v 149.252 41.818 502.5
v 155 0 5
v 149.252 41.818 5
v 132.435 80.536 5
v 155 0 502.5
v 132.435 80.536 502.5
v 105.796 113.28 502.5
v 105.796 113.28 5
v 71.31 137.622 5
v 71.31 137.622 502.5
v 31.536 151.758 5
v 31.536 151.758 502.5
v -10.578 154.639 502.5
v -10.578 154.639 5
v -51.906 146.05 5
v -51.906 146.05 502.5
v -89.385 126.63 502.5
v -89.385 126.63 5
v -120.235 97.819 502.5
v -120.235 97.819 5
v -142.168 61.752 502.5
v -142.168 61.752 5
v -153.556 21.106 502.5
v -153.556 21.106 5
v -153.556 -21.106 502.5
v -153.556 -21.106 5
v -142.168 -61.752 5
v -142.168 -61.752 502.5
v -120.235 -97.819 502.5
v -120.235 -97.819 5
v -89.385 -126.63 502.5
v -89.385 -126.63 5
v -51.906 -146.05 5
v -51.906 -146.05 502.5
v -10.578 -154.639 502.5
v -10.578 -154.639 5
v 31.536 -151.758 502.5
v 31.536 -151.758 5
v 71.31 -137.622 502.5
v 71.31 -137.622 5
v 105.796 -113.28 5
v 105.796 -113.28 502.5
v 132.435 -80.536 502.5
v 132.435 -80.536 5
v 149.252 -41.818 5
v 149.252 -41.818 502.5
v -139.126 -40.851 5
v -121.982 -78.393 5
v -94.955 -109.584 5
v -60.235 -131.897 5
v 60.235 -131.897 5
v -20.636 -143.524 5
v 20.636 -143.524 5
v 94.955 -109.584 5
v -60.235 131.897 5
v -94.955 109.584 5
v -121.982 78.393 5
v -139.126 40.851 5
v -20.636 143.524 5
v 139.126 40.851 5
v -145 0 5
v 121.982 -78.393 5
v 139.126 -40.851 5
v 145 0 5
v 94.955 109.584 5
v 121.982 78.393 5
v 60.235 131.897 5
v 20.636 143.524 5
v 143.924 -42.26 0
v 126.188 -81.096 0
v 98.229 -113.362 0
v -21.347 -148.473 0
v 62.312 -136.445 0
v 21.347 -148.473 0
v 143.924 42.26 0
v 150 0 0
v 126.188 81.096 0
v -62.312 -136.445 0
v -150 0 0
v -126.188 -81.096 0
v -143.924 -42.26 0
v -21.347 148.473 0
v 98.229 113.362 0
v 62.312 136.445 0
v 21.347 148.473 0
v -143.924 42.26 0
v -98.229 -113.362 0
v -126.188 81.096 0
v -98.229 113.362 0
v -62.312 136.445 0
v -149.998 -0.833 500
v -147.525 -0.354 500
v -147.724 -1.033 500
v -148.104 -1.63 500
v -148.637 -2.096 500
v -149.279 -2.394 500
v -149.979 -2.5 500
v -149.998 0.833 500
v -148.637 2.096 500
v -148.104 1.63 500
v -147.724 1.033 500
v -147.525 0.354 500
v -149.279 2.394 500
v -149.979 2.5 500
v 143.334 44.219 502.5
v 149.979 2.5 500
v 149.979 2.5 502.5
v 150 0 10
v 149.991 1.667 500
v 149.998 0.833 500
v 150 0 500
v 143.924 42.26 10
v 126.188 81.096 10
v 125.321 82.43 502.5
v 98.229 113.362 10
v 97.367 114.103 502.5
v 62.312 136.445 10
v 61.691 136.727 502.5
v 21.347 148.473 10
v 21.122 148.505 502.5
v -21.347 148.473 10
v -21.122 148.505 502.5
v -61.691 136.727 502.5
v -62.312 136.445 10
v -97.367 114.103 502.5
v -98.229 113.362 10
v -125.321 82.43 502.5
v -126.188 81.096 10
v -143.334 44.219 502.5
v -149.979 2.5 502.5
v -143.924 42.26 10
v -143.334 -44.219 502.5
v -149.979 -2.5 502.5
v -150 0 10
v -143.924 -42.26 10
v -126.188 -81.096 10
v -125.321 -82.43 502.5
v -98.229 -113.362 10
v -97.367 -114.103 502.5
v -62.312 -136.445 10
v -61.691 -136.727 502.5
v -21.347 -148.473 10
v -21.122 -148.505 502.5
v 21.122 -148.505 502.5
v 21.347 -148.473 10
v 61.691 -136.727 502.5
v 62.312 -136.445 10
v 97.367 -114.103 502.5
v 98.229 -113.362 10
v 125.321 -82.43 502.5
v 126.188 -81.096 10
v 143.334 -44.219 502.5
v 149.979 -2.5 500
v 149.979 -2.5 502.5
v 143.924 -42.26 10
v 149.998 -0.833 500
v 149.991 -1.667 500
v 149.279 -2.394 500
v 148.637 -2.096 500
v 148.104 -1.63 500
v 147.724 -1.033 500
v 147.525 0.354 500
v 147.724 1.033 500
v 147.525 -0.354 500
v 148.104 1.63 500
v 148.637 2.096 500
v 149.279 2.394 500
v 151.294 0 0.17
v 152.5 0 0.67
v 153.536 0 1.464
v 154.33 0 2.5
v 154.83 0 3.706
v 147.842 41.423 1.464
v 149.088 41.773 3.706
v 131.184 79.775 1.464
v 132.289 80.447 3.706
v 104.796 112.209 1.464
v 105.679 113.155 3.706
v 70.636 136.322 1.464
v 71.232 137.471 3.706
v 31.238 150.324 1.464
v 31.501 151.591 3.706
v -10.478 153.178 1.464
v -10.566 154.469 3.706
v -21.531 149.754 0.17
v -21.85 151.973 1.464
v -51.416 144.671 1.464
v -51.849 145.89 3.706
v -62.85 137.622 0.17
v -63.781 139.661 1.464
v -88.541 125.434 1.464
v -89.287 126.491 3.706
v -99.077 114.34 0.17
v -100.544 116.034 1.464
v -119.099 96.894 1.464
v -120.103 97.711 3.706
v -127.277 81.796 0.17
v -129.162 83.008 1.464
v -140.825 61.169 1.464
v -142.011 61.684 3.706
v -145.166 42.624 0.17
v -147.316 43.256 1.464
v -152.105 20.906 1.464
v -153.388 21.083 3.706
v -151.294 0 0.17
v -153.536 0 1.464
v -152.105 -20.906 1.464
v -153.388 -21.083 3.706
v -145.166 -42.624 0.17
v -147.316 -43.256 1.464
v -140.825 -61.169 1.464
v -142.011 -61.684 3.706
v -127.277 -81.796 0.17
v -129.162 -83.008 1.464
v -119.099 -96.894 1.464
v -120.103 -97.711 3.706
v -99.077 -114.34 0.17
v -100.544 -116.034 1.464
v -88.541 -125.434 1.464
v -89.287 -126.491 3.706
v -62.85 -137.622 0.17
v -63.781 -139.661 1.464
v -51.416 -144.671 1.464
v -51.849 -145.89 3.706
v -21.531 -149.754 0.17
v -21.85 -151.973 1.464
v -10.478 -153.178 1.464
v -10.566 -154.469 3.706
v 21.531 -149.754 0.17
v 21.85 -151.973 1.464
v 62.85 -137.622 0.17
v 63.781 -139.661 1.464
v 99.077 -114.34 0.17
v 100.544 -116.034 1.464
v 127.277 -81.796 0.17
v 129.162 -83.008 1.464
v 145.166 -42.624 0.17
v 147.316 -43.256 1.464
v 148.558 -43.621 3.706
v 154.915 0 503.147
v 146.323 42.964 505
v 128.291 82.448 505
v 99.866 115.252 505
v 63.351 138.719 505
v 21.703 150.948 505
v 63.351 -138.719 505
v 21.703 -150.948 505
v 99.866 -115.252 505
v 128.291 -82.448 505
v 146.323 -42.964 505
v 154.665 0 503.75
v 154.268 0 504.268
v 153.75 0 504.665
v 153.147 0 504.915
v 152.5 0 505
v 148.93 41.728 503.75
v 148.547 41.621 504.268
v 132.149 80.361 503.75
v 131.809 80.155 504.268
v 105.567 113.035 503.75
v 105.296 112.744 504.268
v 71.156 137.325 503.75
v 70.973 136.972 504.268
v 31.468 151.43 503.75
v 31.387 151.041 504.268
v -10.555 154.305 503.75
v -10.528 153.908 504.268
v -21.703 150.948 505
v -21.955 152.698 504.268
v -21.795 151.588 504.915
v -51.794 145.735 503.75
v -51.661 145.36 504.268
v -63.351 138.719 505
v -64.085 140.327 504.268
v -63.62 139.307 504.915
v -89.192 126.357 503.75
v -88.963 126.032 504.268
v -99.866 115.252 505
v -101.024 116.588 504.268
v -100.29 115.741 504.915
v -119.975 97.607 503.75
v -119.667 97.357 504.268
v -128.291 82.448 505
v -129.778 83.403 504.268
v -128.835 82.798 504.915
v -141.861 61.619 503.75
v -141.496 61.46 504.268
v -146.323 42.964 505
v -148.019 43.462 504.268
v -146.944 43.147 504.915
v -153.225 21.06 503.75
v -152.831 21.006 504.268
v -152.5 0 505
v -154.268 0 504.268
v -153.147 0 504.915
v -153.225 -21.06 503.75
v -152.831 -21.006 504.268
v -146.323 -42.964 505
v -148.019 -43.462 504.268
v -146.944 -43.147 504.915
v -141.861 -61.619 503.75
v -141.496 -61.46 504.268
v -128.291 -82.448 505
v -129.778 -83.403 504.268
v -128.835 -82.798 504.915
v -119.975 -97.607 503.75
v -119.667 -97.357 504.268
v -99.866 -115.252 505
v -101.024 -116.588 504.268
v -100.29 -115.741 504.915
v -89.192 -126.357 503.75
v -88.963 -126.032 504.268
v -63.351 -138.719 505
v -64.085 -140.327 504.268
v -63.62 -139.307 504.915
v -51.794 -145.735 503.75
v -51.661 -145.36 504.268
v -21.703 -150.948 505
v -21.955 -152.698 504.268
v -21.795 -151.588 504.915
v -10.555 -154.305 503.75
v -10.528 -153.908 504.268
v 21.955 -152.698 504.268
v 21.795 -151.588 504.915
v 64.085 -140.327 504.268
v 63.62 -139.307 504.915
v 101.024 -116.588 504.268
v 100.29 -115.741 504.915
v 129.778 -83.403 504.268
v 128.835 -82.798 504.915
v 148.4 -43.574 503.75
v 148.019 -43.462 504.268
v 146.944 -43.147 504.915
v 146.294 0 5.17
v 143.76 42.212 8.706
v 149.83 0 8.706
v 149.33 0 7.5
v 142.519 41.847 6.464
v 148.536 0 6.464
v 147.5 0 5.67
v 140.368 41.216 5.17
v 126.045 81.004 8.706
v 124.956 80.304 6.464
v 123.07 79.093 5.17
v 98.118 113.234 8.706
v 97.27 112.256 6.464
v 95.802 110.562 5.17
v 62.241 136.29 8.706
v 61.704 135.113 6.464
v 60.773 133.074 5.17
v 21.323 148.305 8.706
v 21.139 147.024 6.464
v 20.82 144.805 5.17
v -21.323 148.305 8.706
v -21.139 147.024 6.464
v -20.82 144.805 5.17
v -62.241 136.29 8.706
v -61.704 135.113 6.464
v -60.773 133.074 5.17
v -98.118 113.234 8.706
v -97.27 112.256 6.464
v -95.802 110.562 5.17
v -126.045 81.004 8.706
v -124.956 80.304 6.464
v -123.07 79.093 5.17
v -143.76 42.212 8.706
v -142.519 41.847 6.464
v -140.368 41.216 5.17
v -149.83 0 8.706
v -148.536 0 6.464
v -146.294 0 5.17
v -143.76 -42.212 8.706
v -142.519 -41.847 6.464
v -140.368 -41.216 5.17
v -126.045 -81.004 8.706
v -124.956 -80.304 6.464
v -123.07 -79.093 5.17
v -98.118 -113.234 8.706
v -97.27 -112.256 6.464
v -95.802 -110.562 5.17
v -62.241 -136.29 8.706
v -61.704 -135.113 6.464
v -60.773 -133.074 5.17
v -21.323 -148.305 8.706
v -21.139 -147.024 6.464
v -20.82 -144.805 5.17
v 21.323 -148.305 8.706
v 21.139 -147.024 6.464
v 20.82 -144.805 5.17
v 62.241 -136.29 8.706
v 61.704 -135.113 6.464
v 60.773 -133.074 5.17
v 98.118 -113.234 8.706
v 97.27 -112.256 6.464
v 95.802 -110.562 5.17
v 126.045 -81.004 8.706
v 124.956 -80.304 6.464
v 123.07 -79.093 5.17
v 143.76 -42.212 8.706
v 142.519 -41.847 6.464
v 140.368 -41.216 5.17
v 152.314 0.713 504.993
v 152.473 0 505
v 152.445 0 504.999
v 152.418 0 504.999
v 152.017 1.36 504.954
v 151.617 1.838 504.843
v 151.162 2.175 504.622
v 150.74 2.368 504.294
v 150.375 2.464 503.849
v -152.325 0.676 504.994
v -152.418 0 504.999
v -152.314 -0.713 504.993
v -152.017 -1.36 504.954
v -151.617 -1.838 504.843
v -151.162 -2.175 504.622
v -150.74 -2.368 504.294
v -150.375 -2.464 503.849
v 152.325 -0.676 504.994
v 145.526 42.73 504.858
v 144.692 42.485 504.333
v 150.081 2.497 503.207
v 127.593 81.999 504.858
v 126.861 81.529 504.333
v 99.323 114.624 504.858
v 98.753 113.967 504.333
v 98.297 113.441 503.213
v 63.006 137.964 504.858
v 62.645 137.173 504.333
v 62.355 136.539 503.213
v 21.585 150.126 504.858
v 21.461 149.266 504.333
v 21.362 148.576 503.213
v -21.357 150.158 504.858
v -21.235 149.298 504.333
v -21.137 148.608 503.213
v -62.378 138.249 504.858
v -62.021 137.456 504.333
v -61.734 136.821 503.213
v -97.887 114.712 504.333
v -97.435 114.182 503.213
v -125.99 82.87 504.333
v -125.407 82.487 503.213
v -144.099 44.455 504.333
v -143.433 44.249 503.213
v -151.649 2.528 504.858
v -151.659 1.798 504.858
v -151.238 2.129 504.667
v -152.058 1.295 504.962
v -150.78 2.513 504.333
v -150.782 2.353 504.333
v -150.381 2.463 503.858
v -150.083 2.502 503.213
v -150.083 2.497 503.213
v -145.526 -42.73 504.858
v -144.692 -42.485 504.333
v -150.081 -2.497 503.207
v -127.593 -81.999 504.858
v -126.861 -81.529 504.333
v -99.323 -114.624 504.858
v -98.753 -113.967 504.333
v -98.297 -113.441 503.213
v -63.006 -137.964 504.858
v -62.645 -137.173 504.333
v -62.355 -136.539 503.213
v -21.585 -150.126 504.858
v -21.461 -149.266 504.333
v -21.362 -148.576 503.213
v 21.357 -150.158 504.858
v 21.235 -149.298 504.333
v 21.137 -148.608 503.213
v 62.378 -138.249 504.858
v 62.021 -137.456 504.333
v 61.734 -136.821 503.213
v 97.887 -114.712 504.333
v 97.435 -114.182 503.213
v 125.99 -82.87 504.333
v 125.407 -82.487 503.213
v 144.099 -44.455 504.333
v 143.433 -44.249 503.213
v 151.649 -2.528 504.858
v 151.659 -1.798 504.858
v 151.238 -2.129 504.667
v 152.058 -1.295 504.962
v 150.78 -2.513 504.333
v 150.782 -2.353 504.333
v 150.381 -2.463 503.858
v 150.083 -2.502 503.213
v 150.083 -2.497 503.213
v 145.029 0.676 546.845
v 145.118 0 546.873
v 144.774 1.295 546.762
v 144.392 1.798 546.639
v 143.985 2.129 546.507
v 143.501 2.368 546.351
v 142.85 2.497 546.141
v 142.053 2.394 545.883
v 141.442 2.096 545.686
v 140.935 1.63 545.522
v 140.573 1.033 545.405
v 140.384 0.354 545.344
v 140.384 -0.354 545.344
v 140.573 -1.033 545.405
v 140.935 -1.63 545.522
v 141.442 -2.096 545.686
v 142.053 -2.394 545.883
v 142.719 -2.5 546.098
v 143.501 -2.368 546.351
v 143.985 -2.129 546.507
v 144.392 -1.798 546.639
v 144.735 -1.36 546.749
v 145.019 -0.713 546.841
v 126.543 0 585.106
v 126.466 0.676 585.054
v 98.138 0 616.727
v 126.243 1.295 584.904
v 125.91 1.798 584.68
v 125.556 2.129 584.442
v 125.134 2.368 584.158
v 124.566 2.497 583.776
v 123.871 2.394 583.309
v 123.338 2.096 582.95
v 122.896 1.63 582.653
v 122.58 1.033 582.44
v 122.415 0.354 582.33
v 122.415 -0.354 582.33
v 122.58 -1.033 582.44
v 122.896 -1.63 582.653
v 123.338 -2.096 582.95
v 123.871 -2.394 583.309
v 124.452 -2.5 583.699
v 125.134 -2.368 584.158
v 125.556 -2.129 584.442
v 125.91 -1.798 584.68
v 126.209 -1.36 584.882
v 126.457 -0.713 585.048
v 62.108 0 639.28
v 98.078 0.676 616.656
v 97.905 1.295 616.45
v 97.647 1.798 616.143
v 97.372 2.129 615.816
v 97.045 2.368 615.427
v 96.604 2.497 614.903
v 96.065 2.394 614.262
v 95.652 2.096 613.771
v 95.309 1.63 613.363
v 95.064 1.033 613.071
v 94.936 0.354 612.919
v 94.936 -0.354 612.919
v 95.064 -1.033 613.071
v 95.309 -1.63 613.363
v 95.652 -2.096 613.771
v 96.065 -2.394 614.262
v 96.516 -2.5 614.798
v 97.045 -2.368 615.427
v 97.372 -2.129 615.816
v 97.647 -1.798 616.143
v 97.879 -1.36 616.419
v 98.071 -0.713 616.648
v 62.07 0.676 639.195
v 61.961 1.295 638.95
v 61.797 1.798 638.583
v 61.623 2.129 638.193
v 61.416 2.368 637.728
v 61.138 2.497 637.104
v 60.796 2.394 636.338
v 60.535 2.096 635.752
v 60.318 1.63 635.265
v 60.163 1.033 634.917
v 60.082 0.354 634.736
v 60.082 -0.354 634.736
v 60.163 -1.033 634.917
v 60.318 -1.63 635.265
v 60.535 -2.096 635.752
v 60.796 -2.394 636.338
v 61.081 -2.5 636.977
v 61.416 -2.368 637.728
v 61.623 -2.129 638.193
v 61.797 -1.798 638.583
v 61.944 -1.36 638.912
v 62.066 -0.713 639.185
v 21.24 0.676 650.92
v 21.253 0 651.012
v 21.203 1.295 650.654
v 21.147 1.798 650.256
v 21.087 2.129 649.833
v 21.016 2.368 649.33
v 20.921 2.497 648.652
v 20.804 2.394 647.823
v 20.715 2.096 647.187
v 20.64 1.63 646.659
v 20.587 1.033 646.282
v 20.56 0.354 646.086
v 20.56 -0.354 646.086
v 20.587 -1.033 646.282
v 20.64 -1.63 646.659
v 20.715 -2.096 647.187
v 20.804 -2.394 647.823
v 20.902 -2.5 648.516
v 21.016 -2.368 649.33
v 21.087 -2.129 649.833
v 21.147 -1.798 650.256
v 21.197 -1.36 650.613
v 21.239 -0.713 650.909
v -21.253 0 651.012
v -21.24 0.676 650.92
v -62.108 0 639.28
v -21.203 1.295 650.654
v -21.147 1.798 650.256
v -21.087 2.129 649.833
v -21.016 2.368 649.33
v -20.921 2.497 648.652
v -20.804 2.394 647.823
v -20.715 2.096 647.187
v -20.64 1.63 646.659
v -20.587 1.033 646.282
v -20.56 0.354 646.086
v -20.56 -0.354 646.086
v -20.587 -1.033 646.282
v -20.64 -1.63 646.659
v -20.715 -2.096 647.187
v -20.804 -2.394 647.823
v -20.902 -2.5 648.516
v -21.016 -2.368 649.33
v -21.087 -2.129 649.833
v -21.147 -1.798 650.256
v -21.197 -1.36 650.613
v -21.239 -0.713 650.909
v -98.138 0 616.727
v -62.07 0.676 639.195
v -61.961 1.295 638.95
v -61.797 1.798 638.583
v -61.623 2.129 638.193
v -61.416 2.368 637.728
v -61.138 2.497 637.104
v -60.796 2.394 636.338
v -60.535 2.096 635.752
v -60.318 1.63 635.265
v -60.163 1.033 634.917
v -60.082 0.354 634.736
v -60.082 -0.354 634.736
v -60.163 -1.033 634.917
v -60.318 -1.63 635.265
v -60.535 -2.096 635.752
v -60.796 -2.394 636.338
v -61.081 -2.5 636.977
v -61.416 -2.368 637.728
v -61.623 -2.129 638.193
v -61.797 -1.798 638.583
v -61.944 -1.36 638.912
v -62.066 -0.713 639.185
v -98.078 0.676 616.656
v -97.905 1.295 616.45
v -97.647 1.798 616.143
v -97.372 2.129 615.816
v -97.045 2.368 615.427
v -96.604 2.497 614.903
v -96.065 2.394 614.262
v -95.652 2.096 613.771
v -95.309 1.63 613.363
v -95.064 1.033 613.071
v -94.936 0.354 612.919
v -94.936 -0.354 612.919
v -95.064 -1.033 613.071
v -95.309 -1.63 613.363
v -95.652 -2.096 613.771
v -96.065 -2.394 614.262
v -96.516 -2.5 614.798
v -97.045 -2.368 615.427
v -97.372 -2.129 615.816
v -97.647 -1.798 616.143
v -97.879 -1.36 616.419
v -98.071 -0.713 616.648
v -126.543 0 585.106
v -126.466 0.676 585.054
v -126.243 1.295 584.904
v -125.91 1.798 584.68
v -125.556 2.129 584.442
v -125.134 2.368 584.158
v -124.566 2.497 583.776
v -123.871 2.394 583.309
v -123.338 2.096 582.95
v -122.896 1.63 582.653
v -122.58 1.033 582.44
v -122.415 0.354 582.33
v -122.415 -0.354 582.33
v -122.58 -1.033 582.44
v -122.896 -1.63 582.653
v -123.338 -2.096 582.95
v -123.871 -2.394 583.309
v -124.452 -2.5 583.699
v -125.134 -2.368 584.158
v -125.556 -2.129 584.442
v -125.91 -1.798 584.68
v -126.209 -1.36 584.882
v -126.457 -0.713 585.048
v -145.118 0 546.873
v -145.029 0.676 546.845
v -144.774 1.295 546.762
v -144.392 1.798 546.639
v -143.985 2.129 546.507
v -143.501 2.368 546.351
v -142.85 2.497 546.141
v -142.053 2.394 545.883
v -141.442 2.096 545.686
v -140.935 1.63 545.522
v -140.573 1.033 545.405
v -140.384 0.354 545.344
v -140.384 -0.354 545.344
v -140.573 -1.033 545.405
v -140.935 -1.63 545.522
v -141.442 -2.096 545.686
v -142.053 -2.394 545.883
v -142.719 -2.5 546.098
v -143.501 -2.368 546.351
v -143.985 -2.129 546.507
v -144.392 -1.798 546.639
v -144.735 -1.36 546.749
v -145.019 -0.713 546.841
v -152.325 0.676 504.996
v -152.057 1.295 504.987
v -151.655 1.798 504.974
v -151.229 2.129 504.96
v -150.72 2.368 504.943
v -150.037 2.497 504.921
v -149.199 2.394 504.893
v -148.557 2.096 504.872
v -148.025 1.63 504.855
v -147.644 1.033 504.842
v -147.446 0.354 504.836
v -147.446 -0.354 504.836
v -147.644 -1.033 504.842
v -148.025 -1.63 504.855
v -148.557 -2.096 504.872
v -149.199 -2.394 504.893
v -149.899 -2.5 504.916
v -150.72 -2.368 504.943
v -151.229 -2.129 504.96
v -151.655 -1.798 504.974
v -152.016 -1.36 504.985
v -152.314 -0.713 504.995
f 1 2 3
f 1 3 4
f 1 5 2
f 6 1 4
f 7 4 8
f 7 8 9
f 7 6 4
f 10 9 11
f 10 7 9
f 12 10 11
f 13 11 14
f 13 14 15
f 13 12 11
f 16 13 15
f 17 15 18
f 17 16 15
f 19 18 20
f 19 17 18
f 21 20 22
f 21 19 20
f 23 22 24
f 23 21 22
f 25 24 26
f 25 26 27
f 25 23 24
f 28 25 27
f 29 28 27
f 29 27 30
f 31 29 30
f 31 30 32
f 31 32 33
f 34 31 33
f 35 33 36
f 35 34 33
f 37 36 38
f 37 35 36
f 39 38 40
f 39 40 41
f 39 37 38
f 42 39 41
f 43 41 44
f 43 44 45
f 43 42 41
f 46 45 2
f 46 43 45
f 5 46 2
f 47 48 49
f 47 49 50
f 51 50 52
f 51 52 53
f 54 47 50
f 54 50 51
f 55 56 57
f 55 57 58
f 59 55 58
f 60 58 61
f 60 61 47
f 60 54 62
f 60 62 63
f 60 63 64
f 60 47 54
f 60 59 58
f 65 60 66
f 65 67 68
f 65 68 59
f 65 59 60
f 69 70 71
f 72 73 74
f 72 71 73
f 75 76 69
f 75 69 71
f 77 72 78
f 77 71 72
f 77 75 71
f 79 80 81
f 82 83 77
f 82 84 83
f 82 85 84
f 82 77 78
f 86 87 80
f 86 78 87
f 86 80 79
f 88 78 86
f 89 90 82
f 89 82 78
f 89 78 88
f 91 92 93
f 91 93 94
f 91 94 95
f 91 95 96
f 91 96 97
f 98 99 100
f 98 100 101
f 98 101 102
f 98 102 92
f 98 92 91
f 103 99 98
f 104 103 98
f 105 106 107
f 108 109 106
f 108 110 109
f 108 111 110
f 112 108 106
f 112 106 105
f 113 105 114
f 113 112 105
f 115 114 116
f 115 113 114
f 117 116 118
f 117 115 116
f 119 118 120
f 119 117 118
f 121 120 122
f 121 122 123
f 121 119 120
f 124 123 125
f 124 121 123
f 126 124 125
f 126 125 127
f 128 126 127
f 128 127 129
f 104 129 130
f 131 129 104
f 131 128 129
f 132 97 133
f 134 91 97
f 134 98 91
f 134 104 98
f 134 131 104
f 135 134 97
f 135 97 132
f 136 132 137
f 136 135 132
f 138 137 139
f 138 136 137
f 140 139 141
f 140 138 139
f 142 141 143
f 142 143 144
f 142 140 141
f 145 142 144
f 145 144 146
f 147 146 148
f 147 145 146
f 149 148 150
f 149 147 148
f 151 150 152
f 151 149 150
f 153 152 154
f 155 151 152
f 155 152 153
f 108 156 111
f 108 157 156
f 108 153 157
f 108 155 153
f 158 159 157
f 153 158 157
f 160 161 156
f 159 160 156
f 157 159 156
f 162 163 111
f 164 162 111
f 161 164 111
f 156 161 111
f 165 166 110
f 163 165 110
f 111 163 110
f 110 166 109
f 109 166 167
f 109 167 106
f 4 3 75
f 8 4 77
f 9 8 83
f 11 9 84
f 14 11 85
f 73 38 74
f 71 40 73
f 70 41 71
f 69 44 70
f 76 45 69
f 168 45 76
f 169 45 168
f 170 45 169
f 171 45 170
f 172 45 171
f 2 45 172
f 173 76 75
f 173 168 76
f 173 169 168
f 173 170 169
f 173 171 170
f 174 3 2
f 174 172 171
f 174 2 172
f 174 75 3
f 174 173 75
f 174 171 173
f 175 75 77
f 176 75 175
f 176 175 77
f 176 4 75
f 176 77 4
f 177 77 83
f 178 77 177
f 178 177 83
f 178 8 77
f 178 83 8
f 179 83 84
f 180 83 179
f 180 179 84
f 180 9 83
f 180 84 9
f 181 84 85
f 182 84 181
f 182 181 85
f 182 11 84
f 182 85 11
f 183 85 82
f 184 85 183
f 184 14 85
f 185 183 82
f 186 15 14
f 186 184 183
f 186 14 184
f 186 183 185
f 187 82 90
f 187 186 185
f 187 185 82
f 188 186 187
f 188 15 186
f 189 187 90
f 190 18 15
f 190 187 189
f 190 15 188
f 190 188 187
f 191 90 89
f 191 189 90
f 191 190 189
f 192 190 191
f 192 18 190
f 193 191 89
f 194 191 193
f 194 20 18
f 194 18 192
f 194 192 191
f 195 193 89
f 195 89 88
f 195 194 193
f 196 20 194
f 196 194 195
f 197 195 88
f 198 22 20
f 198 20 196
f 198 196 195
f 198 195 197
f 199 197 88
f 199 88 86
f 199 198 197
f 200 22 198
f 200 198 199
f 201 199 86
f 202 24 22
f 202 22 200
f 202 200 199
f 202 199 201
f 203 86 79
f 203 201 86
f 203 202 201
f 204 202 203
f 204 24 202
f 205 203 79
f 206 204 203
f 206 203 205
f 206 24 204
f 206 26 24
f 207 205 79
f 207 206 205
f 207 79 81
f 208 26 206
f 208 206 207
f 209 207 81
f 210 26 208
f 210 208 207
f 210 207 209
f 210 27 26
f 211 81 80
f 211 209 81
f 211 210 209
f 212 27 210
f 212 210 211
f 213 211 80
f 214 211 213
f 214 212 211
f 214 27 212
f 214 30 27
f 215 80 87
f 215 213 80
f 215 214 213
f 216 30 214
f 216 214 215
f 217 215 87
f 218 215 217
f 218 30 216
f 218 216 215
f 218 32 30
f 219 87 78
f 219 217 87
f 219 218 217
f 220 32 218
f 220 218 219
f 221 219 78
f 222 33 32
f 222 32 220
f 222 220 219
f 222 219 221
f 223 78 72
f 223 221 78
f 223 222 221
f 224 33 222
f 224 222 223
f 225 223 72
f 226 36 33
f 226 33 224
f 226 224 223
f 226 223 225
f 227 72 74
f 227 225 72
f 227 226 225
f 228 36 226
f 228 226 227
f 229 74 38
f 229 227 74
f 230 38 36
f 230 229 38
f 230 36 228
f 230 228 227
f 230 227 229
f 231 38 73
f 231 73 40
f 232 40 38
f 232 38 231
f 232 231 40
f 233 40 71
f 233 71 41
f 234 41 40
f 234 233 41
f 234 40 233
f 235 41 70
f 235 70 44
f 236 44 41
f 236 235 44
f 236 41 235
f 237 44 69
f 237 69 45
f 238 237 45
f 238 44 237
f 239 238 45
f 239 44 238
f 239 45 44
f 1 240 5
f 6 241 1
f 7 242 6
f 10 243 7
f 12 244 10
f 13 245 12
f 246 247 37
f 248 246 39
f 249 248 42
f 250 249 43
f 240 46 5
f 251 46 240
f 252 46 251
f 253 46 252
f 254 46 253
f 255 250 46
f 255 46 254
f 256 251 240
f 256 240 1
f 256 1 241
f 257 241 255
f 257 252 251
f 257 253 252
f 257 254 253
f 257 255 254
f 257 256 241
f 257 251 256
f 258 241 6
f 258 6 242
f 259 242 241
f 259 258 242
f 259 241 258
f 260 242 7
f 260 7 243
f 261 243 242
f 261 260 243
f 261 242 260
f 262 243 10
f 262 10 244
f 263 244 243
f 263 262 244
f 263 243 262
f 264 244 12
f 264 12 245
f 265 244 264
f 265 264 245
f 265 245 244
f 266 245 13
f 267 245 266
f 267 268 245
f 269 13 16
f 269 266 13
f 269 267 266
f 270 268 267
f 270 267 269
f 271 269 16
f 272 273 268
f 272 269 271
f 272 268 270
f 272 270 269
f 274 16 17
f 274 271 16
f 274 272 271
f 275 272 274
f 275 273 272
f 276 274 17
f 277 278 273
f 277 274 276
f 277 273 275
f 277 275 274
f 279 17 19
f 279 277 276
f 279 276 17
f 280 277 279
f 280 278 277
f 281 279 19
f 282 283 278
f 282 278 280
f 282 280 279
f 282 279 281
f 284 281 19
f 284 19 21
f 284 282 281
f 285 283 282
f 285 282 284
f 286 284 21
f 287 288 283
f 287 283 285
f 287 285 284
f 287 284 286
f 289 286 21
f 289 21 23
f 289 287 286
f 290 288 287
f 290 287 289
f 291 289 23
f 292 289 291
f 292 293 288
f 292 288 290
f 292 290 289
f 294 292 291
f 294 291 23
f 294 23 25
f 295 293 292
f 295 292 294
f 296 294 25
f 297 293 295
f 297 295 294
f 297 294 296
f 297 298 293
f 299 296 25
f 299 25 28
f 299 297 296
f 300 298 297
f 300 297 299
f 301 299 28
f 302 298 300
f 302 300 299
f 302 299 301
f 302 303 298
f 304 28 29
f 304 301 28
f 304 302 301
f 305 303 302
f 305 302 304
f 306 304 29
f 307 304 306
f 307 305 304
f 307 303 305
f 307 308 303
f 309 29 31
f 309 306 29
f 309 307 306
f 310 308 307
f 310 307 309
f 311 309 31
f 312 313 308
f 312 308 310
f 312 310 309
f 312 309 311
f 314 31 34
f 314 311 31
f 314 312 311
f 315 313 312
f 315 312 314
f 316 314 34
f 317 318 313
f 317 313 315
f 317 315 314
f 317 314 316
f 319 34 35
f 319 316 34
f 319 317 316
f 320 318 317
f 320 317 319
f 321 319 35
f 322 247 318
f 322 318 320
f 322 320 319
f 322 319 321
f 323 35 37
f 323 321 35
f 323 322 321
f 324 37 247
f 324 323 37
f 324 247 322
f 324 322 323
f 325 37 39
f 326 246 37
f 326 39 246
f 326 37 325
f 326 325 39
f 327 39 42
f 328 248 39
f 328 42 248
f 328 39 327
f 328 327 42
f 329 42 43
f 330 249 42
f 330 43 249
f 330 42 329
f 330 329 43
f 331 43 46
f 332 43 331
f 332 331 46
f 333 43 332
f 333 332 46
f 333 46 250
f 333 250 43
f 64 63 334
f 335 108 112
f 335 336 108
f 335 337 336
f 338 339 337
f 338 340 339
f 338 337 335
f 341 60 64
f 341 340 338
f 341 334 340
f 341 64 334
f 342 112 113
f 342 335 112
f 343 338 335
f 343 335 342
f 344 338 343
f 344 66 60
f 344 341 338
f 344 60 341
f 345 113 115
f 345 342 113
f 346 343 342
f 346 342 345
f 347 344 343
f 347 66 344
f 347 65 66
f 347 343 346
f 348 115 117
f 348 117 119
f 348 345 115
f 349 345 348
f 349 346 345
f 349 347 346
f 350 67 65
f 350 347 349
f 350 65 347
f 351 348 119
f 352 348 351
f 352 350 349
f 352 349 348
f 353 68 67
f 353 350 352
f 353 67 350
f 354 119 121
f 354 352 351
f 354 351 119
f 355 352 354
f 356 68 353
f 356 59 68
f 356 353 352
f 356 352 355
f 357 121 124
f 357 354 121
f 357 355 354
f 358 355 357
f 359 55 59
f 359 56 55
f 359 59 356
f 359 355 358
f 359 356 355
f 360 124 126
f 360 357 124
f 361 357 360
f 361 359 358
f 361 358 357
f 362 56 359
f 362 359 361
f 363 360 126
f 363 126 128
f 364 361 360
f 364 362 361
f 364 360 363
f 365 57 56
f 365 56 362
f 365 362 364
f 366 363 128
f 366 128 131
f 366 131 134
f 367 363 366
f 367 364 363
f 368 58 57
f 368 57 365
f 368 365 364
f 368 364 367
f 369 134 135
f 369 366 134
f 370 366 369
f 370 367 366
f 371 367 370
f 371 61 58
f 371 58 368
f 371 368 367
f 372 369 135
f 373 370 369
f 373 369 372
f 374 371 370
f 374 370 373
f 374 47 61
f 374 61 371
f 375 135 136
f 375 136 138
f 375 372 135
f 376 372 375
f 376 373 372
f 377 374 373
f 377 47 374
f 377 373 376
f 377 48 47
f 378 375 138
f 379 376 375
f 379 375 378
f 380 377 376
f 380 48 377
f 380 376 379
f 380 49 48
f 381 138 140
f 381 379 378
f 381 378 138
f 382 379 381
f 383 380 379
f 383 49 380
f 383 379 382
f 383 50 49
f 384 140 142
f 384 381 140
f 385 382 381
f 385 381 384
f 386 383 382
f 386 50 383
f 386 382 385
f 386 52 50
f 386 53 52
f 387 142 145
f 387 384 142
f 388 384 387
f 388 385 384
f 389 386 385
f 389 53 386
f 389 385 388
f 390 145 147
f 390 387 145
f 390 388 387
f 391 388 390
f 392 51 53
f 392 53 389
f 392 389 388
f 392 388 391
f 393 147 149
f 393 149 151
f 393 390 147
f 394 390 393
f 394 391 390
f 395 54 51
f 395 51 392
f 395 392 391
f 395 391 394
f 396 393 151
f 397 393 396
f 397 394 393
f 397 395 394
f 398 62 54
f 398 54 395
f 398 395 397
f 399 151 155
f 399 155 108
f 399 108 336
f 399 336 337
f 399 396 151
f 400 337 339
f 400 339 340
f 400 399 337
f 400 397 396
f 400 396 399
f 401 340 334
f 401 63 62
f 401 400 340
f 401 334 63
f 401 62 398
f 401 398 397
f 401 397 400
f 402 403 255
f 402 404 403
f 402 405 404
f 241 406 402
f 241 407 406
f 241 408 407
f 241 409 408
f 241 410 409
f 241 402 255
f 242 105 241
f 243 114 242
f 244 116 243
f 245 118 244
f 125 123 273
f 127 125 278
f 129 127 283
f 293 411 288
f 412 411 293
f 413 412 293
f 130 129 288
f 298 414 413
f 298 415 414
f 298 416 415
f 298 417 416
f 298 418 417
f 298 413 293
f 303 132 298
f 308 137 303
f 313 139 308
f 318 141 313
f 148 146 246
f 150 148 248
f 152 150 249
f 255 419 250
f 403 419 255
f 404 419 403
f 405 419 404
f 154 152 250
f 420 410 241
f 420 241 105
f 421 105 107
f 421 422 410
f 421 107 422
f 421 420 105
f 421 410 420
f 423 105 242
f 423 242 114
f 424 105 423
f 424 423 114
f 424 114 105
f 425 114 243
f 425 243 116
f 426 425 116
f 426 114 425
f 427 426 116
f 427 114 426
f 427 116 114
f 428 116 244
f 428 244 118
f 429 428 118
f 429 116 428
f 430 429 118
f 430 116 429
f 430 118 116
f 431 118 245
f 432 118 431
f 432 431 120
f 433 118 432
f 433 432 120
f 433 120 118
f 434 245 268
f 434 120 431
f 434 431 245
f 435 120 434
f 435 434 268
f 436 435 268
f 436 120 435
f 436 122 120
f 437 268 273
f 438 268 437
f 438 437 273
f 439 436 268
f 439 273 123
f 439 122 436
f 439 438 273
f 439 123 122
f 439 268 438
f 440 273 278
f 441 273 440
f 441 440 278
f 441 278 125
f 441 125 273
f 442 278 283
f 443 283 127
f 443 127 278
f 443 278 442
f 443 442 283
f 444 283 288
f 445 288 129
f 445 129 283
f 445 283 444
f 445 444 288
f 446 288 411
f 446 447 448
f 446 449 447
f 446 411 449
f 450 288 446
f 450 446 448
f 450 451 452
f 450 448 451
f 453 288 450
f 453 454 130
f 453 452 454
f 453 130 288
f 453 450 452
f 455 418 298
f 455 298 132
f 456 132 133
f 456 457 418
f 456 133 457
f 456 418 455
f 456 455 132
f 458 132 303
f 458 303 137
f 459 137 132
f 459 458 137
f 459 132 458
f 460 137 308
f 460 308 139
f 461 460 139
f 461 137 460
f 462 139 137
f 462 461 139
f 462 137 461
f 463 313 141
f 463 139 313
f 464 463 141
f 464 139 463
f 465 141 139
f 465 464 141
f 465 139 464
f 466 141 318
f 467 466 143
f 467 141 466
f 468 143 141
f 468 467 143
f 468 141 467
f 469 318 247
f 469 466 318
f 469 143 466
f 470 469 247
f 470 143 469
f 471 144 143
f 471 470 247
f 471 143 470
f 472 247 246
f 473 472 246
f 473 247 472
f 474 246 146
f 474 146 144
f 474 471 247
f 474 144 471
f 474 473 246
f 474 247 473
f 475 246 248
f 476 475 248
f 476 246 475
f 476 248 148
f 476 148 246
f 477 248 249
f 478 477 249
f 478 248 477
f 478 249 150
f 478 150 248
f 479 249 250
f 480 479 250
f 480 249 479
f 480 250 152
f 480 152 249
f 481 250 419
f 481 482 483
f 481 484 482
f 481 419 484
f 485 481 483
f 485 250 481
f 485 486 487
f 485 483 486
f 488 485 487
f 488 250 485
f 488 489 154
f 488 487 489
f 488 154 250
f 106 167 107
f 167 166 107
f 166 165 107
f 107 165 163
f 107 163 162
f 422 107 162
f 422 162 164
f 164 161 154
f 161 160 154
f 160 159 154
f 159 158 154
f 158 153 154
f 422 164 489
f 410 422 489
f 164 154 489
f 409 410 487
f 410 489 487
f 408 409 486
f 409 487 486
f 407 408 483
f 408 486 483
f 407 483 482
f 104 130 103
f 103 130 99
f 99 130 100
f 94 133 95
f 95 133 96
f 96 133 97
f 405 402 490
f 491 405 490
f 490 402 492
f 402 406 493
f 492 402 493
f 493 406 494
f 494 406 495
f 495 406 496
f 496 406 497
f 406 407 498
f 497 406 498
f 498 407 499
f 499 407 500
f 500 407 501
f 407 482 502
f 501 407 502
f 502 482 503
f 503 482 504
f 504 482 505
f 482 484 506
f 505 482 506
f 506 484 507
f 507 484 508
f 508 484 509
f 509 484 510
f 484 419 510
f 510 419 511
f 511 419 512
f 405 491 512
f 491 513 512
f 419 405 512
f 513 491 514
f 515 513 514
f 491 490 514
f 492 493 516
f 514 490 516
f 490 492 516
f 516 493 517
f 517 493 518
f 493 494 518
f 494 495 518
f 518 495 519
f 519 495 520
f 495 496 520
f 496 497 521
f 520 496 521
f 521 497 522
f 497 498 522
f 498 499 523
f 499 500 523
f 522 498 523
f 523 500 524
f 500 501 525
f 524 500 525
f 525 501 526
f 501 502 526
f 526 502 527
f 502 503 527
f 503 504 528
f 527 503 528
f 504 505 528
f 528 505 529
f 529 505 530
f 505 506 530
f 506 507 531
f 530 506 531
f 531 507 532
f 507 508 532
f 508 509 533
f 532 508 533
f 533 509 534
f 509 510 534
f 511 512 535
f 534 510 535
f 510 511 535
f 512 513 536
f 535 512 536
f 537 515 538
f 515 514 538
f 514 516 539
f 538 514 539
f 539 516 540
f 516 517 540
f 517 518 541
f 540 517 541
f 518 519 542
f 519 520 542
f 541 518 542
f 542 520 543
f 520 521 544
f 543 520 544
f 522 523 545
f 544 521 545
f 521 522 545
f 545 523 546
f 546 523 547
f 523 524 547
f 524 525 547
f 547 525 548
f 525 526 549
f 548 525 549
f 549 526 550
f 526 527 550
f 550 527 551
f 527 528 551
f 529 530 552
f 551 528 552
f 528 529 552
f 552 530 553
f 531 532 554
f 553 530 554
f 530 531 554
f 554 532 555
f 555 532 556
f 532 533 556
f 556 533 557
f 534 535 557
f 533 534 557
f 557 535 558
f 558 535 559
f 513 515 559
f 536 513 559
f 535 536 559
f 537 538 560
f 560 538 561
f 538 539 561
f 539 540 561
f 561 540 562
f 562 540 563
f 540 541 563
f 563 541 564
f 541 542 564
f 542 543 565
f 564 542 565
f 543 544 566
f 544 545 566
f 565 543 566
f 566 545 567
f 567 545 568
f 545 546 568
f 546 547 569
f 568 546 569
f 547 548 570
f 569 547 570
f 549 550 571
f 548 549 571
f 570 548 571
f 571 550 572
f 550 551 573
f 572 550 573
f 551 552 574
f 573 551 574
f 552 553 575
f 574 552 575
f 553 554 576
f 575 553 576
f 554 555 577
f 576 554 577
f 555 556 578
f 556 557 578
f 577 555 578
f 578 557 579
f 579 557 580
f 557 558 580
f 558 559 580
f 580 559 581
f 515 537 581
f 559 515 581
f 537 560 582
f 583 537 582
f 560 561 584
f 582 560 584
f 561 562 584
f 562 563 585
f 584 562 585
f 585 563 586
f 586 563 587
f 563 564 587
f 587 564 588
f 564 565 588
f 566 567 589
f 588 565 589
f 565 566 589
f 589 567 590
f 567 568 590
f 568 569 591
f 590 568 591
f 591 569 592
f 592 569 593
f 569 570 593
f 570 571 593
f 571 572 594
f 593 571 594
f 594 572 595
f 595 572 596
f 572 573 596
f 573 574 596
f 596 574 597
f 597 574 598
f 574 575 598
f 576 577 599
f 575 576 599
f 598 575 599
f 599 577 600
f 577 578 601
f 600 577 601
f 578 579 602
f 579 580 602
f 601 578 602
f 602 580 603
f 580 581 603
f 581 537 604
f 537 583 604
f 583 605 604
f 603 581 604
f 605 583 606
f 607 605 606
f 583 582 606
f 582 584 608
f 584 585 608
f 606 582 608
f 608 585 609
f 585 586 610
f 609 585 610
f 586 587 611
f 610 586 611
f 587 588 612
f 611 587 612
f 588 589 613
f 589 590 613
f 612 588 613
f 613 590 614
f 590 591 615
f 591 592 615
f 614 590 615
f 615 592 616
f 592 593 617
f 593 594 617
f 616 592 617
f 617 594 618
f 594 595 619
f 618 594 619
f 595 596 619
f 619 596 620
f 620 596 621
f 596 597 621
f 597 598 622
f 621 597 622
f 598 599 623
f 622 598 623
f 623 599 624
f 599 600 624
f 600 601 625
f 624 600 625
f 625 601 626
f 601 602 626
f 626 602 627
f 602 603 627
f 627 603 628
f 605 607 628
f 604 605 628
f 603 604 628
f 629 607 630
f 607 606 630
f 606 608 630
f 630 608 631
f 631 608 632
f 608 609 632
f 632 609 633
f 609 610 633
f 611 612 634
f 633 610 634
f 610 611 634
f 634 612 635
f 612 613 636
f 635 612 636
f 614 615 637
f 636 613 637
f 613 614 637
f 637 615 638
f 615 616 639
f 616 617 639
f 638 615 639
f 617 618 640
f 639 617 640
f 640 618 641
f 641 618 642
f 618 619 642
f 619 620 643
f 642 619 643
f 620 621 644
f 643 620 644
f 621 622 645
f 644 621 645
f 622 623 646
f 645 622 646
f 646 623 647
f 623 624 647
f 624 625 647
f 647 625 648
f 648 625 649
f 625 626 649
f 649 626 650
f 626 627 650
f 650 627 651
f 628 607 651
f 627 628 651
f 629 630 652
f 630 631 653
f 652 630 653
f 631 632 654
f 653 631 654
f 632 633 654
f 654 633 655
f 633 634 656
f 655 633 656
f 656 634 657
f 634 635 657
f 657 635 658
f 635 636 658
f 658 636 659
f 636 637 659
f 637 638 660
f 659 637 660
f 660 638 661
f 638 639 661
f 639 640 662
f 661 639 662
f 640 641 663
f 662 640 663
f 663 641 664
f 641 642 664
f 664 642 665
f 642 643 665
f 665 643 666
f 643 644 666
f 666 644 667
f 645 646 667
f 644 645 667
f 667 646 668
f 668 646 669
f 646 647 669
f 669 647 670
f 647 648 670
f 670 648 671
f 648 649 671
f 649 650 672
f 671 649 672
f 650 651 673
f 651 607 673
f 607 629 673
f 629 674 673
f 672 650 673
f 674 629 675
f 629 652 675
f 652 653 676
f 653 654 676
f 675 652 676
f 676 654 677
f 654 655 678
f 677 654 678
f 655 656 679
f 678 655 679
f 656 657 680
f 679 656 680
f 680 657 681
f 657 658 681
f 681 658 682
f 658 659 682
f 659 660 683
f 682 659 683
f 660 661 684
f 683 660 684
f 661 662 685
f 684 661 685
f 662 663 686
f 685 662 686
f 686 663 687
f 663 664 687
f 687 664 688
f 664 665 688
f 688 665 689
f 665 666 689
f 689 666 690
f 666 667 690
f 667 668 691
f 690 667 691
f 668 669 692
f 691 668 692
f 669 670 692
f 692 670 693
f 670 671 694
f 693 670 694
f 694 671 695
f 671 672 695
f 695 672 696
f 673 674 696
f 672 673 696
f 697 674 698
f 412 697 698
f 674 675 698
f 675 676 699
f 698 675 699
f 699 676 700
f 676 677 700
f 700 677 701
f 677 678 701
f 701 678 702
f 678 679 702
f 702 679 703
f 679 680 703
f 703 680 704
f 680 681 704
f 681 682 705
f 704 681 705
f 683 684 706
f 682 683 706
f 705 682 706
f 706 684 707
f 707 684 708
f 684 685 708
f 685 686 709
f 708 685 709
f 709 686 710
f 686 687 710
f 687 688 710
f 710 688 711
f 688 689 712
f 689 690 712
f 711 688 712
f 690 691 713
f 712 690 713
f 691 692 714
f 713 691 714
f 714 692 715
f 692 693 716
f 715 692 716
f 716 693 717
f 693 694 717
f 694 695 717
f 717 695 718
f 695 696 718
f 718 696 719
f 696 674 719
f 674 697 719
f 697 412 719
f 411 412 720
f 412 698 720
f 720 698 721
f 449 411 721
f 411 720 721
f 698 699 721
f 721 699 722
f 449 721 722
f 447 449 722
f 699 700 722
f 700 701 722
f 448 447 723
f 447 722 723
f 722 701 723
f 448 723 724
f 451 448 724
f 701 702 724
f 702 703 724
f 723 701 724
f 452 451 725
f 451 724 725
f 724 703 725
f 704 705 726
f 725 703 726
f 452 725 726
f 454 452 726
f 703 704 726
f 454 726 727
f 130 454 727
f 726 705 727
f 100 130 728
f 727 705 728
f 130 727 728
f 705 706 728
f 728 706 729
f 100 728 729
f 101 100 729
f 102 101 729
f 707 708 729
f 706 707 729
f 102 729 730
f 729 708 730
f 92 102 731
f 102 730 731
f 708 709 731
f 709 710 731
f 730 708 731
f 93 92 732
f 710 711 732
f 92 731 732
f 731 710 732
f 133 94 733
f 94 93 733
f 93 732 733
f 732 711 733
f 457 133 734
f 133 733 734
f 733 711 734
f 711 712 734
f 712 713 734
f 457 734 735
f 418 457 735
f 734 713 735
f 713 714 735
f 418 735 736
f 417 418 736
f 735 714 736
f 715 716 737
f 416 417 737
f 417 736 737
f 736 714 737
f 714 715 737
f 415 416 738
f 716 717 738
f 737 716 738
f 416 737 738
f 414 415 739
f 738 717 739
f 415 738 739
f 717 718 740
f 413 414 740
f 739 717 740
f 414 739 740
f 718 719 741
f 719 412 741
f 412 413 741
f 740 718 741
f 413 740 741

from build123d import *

# Parameters (mm, degrees)
F5_R     = 2.5
F6_ANGLE = -180


with BuildPart() as f1:
    # F0 (on Front) → F1 (revolve)
    with BuildSketch(Plane.XZ):
        with BuildLine():
            Line((0, 5), (0, 0))
            Line((0, 0), (150, 0))
            ThreePointArc((150, 0), (153.535534, 1.464466), (155, 5))
            Line((155, 5), (155, 502.5))
            ThreePointArc((155, 502.5), (154.267767, 504.267767), (152.5, 505))
            ThreePointArc((152.5, 505), (150.732233, 504.267767), (150, 502.5))
            Line((150, 502.5), (150, 10))
            ThreePointArc((150, 10), (148.535534, 6.464466), (145, 5))
            Line((145, 5), (0, 5))
        make_face()
    revolve(axis=Axis((0, 0, 2.5), (0, 0, 1)))

    # F5 (on offset) → F6 (revolve)
    with BuildSketch(Plane.XY.offset(500)):
        with Locations((150, 0)):
            Circle(F5_R)
    revolve(axis=Axis((0, 31.529061, 500), (0, 1, 0)), revolution_arc=F6_ANGLE)


solid = f1.part
